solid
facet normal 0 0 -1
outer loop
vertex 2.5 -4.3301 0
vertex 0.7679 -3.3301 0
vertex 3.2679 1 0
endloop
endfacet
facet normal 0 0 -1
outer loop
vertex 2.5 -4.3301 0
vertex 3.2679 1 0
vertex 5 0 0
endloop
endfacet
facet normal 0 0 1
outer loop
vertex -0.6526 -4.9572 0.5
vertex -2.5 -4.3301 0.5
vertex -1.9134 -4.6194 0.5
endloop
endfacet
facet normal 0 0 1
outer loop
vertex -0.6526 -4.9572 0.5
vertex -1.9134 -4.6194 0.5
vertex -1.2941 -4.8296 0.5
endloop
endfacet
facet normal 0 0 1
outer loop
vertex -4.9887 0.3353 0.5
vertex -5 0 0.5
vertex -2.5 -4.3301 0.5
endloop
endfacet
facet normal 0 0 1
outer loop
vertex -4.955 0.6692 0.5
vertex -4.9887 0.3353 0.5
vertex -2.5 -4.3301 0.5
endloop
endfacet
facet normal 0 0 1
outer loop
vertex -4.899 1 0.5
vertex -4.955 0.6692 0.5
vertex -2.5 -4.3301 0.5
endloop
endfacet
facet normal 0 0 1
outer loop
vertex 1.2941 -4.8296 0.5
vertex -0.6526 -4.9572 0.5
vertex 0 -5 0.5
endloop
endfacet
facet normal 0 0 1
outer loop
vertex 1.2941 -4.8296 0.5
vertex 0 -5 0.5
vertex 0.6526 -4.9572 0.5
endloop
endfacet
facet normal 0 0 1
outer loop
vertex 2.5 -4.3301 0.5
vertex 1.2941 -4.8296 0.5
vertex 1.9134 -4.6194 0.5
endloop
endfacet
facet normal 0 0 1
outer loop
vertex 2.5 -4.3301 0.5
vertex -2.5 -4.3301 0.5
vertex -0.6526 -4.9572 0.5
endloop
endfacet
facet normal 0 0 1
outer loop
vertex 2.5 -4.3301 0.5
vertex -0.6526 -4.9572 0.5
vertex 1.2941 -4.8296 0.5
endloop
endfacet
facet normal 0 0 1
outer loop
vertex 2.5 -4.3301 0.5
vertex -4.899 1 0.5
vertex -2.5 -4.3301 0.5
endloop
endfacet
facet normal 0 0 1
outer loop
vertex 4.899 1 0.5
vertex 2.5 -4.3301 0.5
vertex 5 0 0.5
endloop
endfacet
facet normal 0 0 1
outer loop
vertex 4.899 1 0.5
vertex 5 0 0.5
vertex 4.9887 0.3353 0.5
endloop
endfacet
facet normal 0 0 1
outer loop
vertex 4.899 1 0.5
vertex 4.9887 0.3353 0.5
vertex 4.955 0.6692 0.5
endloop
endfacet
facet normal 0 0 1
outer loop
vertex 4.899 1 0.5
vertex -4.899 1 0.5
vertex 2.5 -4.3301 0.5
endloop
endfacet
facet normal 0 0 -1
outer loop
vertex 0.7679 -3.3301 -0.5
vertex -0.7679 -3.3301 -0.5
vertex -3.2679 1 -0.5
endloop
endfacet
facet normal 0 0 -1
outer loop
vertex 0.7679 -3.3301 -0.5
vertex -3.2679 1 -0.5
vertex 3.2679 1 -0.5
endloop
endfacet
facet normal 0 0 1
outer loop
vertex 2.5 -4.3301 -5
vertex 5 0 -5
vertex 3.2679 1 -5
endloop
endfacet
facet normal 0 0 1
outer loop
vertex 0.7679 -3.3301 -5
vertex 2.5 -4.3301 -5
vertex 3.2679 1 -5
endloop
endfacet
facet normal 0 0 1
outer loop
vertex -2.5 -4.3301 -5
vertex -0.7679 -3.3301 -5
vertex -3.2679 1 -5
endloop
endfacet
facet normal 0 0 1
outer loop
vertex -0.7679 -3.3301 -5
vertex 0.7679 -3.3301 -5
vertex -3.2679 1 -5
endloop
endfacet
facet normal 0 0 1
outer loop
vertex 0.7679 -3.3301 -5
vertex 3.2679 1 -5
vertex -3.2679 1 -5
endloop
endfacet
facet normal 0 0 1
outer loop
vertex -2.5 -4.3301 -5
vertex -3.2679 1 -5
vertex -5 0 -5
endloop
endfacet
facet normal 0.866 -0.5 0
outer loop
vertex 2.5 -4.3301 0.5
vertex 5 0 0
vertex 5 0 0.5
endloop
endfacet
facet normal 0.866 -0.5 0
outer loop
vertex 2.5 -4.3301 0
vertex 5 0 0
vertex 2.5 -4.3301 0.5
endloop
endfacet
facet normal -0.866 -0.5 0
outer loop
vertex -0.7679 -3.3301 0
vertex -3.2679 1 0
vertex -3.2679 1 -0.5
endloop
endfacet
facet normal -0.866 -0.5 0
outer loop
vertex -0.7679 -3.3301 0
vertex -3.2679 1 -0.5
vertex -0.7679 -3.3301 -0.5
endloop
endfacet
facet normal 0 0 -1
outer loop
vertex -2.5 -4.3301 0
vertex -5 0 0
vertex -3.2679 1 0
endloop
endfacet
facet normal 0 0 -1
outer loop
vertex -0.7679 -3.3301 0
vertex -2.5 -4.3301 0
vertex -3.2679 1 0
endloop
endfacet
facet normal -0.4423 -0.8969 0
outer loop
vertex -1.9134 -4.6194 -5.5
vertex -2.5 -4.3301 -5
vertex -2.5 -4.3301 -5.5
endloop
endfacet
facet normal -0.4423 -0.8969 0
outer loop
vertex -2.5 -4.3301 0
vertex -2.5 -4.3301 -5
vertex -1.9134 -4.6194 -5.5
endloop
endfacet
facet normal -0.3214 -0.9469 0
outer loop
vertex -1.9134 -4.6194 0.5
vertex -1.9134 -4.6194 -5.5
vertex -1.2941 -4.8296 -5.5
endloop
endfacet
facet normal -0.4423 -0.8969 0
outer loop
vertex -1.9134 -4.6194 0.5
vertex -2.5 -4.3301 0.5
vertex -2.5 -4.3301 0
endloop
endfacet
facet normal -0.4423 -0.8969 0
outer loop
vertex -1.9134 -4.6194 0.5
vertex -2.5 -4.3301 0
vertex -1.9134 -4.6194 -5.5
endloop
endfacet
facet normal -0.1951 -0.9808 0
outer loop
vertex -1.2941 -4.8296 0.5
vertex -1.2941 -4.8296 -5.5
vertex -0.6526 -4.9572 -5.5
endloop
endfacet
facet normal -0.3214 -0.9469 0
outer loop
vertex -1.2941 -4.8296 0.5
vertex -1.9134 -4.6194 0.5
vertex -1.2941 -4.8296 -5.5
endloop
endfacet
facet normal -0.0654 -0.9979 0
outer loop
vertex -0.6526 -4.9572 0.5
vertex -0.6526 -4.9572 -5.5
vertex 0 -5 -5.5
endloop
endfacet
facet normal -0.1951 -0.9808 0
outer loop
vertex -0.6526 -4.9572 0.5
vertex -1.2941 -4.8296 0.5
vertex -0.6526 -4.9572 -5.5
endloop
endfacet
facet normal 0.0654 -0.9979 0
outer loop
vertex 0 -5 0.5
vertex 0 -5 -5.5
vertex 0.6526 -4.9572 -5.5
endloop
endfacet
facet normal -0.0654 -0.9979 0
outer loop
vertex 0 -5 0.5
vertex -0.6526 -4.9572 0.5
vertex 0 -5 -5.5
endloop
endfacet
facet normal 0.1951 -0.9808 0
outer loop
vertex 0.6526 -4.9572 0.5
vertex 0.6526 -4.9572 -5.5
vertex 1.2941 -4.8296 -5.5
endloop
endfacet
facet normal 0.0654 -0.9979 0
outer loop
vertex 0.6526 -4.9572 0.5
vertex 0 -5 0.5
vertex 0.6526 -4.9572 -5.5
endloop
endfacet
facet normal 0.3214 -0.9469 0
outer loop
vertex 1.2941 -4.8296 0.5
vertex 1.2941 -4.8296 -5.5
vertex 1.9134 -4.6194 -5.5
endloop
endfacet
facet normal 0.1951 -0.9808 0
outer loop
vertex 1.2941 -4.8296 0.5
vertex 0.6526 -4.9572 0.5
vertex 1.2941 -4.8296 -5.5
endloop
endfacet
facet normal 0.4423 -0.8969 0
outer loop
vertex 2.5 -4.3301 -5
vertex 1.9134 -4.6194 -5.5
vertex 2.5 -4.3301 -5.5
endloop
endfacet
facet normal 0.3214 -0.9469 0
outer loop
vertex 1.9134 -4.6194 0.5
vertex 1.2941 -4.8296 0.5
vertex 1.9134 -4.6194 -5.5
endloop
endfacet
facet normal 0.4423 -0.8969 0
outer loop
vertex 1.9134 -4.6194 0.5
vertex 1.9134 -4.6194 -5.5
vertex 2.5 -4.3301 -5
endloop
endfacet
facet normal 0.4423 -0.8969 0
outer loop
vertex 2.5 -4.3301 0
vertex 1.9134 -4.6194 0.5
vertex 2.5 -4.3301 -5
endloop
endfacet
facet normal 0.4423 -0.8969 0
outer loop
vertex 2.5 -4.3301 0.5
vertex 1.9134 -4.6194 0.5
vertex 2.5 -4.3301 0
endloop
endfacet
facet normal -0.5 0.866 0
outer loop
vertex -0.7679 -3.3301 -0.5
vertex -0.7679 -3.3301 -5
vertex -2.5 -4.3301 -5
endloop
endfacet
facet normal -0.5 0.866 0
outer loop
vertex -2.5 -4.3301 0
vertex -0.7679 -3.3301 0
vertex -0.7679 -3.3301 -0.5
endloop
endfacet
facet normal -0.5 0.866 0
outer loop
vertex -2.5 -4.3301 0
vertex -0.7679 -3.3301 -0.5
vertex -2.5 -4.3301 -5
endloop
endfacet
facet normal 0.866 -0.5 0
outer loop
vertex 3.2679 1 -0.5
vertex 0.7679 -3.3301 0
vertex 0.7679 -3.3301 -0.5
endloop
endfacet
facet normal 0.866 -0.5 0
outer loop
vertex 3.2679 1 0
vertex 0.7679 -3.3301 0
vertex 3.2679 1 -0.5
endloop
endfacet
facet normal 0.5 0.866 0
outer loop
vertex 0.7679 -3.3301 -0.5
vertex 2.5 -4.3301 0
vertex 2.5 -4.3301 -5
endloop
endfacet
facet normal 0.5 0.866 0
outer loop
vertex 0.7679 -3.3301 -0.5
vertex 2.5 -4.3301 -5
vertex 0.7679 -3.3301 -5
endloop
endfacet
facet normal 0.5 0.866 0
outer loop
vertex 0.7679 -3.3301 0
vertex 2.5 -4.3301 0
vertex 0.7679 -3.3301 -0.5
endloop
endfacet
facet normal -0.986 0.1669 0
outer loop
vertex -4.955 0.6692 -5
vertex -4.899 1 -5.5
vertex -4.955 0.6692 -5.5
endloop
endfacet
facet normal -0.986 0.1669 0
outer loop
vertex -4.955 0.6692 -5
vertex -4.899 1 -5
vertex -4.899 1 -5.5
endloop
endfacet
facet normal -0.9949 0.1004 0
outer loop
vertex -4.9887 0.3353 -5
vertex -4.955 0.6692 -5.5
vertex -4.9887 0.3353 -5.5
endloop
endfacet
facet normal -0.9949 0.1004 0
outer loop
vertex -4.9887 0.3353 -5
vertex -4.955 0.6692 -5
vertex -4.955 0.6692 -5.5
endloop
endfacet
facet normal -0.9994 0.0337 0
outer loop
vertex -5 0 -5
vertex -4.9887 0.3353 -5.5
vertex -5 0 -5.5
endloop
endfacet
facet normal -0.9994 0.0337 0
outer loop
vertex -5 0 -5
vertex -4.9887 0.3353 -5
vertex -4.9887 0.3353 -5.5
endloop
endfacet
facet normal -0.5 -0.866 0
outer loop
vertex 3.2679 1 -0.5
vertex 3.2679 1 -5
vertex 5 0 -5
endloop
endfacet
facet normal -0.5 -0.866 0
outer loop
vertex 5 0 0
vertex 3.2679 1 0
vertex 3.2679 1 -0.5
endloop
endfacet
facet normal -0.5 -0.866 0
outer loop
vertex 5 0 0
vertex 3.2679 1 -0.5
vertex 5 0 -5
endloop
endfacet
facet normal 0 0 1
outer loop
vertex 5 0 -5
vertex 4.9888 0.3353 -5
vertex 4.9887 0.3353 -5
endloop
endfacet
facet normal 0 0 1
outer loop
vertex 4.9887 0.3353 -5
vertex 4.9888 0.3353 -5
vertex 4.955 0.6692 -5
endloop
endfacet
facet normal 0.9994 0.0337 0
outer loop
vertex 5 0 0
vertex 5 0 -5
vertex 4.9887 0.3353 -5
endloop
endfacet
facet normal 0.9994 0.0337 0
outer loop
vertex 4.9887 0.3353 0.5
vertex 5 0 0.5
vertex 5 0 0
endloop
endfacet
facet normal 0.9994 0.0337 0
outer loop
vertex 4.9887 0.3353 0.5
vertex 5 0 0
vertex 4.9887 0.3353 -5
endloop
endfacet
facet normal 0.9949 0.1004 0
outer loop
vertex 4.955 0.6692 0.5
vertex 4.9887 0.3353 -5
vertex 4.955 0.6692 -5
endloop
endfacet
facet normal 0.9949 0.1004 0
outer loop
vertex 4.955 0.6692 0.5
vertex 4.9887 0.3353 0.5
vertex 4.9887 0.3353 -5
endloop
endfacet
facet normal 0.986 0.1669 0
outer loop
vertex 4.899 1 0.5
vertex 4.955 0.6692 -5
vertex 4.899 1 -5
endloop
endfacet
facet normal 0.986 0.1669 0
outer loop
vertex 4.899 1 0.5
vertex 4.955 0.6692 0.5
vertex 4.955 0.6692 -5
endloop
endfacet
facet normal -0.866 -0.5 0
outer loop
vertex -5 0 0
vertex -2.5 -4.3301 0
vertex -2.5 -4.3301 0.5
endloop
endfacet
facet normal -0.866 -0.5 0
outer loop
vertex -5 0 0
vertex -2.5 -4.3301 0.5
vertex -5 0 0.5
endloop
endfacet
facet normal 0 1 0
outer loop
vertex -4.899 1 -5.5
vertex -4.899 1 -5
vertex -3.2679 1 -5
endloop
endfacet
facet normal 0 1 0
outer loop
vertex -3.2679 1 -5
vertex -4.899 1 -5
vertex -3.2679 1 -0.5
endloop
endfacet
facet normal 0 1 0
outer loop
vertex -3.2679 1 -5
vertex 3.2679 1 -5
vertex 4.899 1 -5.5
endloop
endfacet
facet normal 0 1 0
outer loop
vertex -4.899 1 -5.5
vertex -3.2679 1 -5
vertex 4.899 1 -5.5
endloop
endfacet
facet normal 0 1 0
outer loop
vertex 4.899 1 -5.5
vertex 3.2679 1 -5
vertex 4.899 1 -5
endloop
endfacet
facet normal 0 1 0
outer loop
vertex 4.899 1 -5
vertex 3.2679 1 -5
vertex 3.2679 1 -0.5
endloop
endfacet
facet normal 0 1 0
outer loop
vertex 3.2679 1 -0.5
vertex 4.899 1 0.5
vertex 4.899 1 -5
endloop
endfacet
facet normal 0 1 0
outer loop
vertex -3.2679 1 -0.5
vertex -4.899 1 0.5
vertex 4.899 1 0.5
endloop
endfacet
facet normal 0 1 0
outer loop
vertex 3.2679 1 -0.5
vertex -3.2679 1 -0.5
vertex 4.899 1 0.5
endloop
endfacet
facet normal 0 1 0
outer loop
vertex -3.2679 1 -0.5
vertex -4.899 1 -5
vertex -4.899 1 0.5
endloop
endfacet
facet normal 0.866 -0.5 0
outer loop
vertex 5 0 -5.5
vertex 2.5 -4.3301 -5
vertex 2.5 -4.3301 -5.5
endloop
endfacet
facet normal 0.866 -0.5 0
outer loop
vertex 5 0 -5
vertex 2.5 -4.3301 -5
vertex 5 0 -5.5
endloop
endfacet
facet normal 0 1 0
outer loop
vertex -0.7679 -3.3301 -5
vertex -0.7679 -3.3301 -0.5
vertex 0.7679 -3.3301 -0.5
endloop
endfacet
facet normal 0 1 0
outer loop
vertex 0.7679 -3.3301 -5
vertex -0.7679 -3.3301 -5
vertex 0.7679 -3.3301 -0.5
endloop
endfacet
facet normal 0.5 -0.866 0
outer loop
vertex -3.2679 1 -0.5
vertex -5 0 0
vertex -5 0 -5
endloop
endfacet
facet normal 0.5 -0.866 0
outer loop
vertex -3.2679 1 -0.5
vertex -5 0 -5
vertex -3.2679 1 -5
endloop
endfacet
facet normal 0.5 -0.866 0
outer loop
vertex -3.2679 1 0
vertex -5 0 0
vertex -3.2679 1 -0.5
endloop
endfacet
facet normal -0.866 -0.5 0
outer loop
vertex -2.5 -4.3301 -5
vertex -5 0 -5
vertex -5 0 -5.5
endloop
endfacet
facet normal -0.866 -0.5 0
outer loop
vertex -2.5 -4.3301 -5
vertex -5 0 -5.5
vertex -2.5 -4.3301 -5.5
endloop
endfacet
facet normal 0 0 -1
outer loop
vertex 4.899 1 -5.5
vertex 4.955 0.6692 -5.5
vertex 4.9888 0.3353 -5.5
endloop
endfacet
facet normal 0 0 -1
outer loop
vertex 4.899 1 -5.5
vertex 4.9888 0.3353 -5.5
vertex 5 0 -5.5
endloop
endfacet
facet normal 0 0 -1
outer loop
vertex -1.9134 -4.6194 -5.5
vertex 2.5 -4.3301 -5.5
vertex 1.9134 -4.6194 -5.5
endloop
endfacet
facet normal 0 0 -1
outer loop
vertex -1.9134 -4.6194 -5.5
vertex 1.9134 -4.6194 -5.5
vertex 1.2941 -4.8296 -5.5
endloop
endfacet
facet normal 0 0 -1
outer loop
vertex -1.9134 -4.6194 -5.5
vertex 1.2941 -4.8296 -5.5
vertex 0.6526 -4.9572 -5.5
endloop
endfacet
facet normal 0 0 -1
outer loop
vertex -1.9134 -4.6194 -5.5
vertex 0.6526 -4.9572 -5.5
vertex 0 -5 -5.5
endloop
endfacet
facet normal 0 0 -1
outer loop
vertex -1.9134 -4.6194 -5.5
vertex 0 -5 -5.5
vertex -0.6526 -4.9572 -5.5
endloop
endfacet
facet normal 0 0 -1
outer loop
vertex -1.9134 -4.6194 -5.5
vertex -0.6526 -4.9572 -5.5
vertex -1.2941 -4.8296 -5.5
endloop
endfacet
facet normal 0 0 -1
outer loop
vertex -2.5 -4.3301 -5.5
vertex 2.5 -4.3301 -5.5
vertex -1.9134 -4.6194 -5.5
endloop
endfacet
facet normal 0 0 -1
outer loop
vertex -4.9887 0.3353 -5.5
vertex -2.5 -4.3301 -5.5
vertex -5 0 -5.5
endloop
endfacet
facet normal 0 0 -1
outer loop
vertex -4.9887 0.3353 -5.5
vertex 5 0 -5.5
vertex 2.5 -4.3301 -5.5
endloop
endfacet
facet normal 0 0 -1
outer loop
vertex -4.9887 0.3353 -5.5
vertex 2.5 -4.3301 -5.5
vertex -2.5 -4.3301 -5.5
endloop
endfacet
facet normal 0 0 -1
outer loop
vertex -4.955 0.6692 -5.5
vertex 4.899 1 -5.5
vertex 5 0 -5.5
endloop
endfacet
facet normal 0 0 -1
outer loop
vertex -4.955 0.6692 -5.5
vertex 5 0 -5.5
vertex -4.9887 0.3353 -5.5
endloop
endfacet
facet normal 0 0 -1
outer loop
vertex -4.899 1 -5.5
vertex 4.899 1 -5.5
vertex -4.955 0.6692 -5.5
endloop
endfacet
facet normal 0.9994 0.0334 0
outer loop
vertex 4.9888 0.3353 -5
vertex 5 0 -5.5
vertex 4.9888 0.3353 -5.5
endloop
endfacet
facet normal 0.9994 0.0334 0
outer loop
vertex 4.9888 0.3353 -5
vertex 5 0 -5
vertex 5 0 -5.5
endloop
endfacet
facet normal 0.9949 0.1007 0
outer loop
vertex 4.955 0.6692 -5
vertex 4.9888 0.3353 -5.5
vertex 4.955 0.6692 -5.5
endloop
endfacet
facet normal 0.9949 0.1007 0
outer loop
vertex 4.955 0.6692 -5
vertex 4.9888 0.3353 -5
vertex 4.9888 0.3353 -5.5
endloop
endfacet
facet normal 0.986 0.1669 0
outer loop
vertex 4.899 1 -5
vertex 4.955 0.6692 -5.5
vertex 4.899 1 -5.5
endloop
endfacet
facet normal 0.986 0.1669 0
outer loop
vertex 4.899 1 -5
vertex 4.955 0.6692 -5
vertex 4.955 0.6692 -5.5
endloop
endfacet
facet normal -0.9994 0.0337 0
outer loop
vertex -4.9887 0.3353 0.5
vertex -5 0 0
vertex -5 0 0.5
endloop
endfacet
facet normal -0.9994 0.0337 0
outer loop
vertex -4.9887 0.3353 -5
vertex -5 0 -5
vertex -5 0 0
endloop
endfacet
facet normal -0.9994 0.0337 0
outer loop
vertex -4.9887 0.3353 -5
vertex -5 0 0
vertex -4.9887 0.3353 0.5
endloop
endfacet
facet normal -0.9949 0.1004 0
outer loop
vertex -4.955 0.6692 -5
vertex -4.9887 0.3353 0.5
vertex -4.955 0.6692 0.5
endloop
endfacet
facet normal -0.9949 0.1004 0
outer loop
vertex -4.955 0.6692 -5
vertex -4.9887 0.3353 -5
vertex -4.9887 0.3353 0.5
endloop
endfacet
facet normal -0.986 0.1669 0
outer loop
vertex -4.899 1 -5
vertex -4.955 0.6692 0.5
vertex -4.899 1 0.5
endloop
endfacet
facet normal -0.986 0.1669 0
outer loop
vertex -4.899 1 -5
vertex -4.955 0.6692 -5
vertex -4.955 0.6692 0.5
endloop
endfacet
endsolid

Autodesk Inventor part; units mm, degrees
ref_plane "YZ Plane" through (0, 0, 0) normal (1, 0, 0) x (0, 1, 0)
ref_plane "XZ Plane" through (0, 0, 0) normal (0, 1, 0) x (-1, 0, 0)
sketch "Sketch9" plane through (0, 0, 0) normal (0, 0, 1) x (1, 0, 0)
  line L0 (5, 0) -> (2.5, -4.3301)
  line L1 (2.5, -4.3301) -> (-2.5, -4.3301)
  line L2 (-2.5, -4.3301) -> (-5, 0)
  line L3 (-5, 0) -> (-2.5, 4.3301)
  line L4 (-2.5, 4.3301) -> (2.5, 4.3301)
  line L5 (2.5, 4.3301) -> (5, 0)
  line L6 (2.5, 4.3301) -> (2.5, 2.3301)
  line L7 (2.5, 2.3301) -> (-2.5, 2.3301)
  line L8 (-2.5, 2.3301) -> (-2.5, 4.3301)
  line L9 (-2.5, -4.3301) -> (-5, 0)
  line L10 (-0.7679, -3.3301) -> (-2.5, -4.3301)
  line L11 (-3.2679, 1) -> (-0.7679, -3.3301)
  line L12 (-5, 0) -> (-3.2679, 1)
  line L13 (5, 0) -> (2.5, -4.3301)
  line L14 (3.2679, 1) -> (5, 0)
  line L15 (0.7679, -3.3301) -> (3.2679, 1)
  line L16 (2.5, -4.3301) -> (0.7679, -3.3301)
  point P0 (0, 0)
  point P1 (0, 0)
  point P2 (-5, 0)
  dimension "d62" = 5
  dimension "d63" = 2
  dimension "d66" = 360
extrude "Extrusion9" add sketch "Sketch9" against normal blind 0.5 contours L14 L15 L16 L1 L10 L11 L12 L3 L8 L7 L6 L5
sketch "Sketch11" plane through (0, 0, -0.5) normal (0, 0, -1) x (-1, 0, 0)
  line L0 (2.5, 2.3301) -> (-2.5, 2.3301) projected
  line L1 (-2.5, 2.3301) -> (-2.5, 4.3301) projected
  line L2 (-2.5, 2.3301) -> (-2.5, 4.3301)
  line L3 (-5, 0) -> (-2.5, 4.3301) projected
  line L4 (-2.5, 4.3301) -> (-5, 0)
  line L5 (-3.2679, 1) -> (-0.7679, -3.3301) projected
  line L6 (-5, 0) -> (-3.2679, 1)
  line L7 (-3.2679, 1) -> (-2.5, 2.3301)
  line L8 (2.5, 4.3301) -> (2.5, 2.3301) projected
  line L9 (2.5, 4.3301) -> (2.5, 2.3301)
  line L10 (2.5, 2.3301) -> (3.2679, 1)
  line L11 (3.2679, 1) -> (5, 0)
  line L12 (5, 0) -> (2.5, 4.3301)
  line L13 (-0.7679, -3.3301) -> (-2.5, -4.3301)
  line L14 (2.5, -4.3301) -> (0.7679, -3.3301) projected
  line L15 (-2.5, -4.3301) -> (2.5, -4.3301)
  line L16 (2.5, -4.3301) -> (0.7679, -3.3301)
  line L17 (0.7679, -3.3301) -> (-0.7679, -3.3301)
  point P0 (0, 0)
extrude "Extrusion10" add sketch "Sketch11" along normal blind 4.5
sketch "Sketch12" plane through (0, 0, 0) normal (0, 0, 1) x (1, 0, 0)
  line L0 (3.2679, 1) -> (5, 0) projected
  line L1 (-2.5, 4.3301) -> (-5, 0)
  line L2 (-2.5, -4.3301) -> (2.5, -4.3301)
  line L3 (2.5, 4.3301) -> (2.5, 2.3301) projected
  line L4 (5, 0) -> (2.5, 4.3301)
  arc A0 (-2.5, 4.3301) -> (-5, 0) centre (0, 0) ccw
  arc A1 (-2.5, -4.3301) -> (2.5, -4.3301) centre (0, 0) ccw
  arc A2 (5, 0) -> (2.5, 4.3301) centre (0, 0) ccw
extrude "Extrusion11" add sketch "Sketch12" against normal blind 5
extrude "Extrusion12" add sketch "Sketch9" along normal blind 0.5
extrude "Extrusion13" add sketch "Sketch12" along normal blind 0.5
ref_plane "Work Plane1" through (3.2679, 1, -5) normal (0, 1, 0) x (-1, 0, 0)
split "Split1" plane through (3.2679, 1, -5) removes the side toward (0, 1, 0)
sketch "Sketch14" plane through (0, 0, -5) normal (0, 0, -1) x (-1, 0, 0)
  arc A0 (-2.5, -4.3301) -> (2.5, -4.3301) centre (0, 0) ccw projected
  line L0 (5, 0) -> (2.5, -4.3301) projected
  line L1 (5, 0) -> (2.5, -4.3301)
  line L2 (-2.5, -4.3301) -> (-5, 0) projected
  line L3 (-2.5, -4.3301) -> (-5, 0)
  line L4 (4.899, 1) -> (-4.899, 1)
  line L5 (3.2679, 1) -> (-3.2679, 1) projected
  arc A1 (5, 0) -> (4.899, 1) centre (0, 0) ccw
  arc A2 (-4.899, 1) -> (-5, 0) centre (0, 0) ccw
  arc A3 (-2.5, -4.3301) -> (2.5, -4.3301) centre (0, 0) ccw
extrude "Extrusion14" add sketch "Sketch14" along normal blind 0.5
properties part number "BodyFoldedSide1"
